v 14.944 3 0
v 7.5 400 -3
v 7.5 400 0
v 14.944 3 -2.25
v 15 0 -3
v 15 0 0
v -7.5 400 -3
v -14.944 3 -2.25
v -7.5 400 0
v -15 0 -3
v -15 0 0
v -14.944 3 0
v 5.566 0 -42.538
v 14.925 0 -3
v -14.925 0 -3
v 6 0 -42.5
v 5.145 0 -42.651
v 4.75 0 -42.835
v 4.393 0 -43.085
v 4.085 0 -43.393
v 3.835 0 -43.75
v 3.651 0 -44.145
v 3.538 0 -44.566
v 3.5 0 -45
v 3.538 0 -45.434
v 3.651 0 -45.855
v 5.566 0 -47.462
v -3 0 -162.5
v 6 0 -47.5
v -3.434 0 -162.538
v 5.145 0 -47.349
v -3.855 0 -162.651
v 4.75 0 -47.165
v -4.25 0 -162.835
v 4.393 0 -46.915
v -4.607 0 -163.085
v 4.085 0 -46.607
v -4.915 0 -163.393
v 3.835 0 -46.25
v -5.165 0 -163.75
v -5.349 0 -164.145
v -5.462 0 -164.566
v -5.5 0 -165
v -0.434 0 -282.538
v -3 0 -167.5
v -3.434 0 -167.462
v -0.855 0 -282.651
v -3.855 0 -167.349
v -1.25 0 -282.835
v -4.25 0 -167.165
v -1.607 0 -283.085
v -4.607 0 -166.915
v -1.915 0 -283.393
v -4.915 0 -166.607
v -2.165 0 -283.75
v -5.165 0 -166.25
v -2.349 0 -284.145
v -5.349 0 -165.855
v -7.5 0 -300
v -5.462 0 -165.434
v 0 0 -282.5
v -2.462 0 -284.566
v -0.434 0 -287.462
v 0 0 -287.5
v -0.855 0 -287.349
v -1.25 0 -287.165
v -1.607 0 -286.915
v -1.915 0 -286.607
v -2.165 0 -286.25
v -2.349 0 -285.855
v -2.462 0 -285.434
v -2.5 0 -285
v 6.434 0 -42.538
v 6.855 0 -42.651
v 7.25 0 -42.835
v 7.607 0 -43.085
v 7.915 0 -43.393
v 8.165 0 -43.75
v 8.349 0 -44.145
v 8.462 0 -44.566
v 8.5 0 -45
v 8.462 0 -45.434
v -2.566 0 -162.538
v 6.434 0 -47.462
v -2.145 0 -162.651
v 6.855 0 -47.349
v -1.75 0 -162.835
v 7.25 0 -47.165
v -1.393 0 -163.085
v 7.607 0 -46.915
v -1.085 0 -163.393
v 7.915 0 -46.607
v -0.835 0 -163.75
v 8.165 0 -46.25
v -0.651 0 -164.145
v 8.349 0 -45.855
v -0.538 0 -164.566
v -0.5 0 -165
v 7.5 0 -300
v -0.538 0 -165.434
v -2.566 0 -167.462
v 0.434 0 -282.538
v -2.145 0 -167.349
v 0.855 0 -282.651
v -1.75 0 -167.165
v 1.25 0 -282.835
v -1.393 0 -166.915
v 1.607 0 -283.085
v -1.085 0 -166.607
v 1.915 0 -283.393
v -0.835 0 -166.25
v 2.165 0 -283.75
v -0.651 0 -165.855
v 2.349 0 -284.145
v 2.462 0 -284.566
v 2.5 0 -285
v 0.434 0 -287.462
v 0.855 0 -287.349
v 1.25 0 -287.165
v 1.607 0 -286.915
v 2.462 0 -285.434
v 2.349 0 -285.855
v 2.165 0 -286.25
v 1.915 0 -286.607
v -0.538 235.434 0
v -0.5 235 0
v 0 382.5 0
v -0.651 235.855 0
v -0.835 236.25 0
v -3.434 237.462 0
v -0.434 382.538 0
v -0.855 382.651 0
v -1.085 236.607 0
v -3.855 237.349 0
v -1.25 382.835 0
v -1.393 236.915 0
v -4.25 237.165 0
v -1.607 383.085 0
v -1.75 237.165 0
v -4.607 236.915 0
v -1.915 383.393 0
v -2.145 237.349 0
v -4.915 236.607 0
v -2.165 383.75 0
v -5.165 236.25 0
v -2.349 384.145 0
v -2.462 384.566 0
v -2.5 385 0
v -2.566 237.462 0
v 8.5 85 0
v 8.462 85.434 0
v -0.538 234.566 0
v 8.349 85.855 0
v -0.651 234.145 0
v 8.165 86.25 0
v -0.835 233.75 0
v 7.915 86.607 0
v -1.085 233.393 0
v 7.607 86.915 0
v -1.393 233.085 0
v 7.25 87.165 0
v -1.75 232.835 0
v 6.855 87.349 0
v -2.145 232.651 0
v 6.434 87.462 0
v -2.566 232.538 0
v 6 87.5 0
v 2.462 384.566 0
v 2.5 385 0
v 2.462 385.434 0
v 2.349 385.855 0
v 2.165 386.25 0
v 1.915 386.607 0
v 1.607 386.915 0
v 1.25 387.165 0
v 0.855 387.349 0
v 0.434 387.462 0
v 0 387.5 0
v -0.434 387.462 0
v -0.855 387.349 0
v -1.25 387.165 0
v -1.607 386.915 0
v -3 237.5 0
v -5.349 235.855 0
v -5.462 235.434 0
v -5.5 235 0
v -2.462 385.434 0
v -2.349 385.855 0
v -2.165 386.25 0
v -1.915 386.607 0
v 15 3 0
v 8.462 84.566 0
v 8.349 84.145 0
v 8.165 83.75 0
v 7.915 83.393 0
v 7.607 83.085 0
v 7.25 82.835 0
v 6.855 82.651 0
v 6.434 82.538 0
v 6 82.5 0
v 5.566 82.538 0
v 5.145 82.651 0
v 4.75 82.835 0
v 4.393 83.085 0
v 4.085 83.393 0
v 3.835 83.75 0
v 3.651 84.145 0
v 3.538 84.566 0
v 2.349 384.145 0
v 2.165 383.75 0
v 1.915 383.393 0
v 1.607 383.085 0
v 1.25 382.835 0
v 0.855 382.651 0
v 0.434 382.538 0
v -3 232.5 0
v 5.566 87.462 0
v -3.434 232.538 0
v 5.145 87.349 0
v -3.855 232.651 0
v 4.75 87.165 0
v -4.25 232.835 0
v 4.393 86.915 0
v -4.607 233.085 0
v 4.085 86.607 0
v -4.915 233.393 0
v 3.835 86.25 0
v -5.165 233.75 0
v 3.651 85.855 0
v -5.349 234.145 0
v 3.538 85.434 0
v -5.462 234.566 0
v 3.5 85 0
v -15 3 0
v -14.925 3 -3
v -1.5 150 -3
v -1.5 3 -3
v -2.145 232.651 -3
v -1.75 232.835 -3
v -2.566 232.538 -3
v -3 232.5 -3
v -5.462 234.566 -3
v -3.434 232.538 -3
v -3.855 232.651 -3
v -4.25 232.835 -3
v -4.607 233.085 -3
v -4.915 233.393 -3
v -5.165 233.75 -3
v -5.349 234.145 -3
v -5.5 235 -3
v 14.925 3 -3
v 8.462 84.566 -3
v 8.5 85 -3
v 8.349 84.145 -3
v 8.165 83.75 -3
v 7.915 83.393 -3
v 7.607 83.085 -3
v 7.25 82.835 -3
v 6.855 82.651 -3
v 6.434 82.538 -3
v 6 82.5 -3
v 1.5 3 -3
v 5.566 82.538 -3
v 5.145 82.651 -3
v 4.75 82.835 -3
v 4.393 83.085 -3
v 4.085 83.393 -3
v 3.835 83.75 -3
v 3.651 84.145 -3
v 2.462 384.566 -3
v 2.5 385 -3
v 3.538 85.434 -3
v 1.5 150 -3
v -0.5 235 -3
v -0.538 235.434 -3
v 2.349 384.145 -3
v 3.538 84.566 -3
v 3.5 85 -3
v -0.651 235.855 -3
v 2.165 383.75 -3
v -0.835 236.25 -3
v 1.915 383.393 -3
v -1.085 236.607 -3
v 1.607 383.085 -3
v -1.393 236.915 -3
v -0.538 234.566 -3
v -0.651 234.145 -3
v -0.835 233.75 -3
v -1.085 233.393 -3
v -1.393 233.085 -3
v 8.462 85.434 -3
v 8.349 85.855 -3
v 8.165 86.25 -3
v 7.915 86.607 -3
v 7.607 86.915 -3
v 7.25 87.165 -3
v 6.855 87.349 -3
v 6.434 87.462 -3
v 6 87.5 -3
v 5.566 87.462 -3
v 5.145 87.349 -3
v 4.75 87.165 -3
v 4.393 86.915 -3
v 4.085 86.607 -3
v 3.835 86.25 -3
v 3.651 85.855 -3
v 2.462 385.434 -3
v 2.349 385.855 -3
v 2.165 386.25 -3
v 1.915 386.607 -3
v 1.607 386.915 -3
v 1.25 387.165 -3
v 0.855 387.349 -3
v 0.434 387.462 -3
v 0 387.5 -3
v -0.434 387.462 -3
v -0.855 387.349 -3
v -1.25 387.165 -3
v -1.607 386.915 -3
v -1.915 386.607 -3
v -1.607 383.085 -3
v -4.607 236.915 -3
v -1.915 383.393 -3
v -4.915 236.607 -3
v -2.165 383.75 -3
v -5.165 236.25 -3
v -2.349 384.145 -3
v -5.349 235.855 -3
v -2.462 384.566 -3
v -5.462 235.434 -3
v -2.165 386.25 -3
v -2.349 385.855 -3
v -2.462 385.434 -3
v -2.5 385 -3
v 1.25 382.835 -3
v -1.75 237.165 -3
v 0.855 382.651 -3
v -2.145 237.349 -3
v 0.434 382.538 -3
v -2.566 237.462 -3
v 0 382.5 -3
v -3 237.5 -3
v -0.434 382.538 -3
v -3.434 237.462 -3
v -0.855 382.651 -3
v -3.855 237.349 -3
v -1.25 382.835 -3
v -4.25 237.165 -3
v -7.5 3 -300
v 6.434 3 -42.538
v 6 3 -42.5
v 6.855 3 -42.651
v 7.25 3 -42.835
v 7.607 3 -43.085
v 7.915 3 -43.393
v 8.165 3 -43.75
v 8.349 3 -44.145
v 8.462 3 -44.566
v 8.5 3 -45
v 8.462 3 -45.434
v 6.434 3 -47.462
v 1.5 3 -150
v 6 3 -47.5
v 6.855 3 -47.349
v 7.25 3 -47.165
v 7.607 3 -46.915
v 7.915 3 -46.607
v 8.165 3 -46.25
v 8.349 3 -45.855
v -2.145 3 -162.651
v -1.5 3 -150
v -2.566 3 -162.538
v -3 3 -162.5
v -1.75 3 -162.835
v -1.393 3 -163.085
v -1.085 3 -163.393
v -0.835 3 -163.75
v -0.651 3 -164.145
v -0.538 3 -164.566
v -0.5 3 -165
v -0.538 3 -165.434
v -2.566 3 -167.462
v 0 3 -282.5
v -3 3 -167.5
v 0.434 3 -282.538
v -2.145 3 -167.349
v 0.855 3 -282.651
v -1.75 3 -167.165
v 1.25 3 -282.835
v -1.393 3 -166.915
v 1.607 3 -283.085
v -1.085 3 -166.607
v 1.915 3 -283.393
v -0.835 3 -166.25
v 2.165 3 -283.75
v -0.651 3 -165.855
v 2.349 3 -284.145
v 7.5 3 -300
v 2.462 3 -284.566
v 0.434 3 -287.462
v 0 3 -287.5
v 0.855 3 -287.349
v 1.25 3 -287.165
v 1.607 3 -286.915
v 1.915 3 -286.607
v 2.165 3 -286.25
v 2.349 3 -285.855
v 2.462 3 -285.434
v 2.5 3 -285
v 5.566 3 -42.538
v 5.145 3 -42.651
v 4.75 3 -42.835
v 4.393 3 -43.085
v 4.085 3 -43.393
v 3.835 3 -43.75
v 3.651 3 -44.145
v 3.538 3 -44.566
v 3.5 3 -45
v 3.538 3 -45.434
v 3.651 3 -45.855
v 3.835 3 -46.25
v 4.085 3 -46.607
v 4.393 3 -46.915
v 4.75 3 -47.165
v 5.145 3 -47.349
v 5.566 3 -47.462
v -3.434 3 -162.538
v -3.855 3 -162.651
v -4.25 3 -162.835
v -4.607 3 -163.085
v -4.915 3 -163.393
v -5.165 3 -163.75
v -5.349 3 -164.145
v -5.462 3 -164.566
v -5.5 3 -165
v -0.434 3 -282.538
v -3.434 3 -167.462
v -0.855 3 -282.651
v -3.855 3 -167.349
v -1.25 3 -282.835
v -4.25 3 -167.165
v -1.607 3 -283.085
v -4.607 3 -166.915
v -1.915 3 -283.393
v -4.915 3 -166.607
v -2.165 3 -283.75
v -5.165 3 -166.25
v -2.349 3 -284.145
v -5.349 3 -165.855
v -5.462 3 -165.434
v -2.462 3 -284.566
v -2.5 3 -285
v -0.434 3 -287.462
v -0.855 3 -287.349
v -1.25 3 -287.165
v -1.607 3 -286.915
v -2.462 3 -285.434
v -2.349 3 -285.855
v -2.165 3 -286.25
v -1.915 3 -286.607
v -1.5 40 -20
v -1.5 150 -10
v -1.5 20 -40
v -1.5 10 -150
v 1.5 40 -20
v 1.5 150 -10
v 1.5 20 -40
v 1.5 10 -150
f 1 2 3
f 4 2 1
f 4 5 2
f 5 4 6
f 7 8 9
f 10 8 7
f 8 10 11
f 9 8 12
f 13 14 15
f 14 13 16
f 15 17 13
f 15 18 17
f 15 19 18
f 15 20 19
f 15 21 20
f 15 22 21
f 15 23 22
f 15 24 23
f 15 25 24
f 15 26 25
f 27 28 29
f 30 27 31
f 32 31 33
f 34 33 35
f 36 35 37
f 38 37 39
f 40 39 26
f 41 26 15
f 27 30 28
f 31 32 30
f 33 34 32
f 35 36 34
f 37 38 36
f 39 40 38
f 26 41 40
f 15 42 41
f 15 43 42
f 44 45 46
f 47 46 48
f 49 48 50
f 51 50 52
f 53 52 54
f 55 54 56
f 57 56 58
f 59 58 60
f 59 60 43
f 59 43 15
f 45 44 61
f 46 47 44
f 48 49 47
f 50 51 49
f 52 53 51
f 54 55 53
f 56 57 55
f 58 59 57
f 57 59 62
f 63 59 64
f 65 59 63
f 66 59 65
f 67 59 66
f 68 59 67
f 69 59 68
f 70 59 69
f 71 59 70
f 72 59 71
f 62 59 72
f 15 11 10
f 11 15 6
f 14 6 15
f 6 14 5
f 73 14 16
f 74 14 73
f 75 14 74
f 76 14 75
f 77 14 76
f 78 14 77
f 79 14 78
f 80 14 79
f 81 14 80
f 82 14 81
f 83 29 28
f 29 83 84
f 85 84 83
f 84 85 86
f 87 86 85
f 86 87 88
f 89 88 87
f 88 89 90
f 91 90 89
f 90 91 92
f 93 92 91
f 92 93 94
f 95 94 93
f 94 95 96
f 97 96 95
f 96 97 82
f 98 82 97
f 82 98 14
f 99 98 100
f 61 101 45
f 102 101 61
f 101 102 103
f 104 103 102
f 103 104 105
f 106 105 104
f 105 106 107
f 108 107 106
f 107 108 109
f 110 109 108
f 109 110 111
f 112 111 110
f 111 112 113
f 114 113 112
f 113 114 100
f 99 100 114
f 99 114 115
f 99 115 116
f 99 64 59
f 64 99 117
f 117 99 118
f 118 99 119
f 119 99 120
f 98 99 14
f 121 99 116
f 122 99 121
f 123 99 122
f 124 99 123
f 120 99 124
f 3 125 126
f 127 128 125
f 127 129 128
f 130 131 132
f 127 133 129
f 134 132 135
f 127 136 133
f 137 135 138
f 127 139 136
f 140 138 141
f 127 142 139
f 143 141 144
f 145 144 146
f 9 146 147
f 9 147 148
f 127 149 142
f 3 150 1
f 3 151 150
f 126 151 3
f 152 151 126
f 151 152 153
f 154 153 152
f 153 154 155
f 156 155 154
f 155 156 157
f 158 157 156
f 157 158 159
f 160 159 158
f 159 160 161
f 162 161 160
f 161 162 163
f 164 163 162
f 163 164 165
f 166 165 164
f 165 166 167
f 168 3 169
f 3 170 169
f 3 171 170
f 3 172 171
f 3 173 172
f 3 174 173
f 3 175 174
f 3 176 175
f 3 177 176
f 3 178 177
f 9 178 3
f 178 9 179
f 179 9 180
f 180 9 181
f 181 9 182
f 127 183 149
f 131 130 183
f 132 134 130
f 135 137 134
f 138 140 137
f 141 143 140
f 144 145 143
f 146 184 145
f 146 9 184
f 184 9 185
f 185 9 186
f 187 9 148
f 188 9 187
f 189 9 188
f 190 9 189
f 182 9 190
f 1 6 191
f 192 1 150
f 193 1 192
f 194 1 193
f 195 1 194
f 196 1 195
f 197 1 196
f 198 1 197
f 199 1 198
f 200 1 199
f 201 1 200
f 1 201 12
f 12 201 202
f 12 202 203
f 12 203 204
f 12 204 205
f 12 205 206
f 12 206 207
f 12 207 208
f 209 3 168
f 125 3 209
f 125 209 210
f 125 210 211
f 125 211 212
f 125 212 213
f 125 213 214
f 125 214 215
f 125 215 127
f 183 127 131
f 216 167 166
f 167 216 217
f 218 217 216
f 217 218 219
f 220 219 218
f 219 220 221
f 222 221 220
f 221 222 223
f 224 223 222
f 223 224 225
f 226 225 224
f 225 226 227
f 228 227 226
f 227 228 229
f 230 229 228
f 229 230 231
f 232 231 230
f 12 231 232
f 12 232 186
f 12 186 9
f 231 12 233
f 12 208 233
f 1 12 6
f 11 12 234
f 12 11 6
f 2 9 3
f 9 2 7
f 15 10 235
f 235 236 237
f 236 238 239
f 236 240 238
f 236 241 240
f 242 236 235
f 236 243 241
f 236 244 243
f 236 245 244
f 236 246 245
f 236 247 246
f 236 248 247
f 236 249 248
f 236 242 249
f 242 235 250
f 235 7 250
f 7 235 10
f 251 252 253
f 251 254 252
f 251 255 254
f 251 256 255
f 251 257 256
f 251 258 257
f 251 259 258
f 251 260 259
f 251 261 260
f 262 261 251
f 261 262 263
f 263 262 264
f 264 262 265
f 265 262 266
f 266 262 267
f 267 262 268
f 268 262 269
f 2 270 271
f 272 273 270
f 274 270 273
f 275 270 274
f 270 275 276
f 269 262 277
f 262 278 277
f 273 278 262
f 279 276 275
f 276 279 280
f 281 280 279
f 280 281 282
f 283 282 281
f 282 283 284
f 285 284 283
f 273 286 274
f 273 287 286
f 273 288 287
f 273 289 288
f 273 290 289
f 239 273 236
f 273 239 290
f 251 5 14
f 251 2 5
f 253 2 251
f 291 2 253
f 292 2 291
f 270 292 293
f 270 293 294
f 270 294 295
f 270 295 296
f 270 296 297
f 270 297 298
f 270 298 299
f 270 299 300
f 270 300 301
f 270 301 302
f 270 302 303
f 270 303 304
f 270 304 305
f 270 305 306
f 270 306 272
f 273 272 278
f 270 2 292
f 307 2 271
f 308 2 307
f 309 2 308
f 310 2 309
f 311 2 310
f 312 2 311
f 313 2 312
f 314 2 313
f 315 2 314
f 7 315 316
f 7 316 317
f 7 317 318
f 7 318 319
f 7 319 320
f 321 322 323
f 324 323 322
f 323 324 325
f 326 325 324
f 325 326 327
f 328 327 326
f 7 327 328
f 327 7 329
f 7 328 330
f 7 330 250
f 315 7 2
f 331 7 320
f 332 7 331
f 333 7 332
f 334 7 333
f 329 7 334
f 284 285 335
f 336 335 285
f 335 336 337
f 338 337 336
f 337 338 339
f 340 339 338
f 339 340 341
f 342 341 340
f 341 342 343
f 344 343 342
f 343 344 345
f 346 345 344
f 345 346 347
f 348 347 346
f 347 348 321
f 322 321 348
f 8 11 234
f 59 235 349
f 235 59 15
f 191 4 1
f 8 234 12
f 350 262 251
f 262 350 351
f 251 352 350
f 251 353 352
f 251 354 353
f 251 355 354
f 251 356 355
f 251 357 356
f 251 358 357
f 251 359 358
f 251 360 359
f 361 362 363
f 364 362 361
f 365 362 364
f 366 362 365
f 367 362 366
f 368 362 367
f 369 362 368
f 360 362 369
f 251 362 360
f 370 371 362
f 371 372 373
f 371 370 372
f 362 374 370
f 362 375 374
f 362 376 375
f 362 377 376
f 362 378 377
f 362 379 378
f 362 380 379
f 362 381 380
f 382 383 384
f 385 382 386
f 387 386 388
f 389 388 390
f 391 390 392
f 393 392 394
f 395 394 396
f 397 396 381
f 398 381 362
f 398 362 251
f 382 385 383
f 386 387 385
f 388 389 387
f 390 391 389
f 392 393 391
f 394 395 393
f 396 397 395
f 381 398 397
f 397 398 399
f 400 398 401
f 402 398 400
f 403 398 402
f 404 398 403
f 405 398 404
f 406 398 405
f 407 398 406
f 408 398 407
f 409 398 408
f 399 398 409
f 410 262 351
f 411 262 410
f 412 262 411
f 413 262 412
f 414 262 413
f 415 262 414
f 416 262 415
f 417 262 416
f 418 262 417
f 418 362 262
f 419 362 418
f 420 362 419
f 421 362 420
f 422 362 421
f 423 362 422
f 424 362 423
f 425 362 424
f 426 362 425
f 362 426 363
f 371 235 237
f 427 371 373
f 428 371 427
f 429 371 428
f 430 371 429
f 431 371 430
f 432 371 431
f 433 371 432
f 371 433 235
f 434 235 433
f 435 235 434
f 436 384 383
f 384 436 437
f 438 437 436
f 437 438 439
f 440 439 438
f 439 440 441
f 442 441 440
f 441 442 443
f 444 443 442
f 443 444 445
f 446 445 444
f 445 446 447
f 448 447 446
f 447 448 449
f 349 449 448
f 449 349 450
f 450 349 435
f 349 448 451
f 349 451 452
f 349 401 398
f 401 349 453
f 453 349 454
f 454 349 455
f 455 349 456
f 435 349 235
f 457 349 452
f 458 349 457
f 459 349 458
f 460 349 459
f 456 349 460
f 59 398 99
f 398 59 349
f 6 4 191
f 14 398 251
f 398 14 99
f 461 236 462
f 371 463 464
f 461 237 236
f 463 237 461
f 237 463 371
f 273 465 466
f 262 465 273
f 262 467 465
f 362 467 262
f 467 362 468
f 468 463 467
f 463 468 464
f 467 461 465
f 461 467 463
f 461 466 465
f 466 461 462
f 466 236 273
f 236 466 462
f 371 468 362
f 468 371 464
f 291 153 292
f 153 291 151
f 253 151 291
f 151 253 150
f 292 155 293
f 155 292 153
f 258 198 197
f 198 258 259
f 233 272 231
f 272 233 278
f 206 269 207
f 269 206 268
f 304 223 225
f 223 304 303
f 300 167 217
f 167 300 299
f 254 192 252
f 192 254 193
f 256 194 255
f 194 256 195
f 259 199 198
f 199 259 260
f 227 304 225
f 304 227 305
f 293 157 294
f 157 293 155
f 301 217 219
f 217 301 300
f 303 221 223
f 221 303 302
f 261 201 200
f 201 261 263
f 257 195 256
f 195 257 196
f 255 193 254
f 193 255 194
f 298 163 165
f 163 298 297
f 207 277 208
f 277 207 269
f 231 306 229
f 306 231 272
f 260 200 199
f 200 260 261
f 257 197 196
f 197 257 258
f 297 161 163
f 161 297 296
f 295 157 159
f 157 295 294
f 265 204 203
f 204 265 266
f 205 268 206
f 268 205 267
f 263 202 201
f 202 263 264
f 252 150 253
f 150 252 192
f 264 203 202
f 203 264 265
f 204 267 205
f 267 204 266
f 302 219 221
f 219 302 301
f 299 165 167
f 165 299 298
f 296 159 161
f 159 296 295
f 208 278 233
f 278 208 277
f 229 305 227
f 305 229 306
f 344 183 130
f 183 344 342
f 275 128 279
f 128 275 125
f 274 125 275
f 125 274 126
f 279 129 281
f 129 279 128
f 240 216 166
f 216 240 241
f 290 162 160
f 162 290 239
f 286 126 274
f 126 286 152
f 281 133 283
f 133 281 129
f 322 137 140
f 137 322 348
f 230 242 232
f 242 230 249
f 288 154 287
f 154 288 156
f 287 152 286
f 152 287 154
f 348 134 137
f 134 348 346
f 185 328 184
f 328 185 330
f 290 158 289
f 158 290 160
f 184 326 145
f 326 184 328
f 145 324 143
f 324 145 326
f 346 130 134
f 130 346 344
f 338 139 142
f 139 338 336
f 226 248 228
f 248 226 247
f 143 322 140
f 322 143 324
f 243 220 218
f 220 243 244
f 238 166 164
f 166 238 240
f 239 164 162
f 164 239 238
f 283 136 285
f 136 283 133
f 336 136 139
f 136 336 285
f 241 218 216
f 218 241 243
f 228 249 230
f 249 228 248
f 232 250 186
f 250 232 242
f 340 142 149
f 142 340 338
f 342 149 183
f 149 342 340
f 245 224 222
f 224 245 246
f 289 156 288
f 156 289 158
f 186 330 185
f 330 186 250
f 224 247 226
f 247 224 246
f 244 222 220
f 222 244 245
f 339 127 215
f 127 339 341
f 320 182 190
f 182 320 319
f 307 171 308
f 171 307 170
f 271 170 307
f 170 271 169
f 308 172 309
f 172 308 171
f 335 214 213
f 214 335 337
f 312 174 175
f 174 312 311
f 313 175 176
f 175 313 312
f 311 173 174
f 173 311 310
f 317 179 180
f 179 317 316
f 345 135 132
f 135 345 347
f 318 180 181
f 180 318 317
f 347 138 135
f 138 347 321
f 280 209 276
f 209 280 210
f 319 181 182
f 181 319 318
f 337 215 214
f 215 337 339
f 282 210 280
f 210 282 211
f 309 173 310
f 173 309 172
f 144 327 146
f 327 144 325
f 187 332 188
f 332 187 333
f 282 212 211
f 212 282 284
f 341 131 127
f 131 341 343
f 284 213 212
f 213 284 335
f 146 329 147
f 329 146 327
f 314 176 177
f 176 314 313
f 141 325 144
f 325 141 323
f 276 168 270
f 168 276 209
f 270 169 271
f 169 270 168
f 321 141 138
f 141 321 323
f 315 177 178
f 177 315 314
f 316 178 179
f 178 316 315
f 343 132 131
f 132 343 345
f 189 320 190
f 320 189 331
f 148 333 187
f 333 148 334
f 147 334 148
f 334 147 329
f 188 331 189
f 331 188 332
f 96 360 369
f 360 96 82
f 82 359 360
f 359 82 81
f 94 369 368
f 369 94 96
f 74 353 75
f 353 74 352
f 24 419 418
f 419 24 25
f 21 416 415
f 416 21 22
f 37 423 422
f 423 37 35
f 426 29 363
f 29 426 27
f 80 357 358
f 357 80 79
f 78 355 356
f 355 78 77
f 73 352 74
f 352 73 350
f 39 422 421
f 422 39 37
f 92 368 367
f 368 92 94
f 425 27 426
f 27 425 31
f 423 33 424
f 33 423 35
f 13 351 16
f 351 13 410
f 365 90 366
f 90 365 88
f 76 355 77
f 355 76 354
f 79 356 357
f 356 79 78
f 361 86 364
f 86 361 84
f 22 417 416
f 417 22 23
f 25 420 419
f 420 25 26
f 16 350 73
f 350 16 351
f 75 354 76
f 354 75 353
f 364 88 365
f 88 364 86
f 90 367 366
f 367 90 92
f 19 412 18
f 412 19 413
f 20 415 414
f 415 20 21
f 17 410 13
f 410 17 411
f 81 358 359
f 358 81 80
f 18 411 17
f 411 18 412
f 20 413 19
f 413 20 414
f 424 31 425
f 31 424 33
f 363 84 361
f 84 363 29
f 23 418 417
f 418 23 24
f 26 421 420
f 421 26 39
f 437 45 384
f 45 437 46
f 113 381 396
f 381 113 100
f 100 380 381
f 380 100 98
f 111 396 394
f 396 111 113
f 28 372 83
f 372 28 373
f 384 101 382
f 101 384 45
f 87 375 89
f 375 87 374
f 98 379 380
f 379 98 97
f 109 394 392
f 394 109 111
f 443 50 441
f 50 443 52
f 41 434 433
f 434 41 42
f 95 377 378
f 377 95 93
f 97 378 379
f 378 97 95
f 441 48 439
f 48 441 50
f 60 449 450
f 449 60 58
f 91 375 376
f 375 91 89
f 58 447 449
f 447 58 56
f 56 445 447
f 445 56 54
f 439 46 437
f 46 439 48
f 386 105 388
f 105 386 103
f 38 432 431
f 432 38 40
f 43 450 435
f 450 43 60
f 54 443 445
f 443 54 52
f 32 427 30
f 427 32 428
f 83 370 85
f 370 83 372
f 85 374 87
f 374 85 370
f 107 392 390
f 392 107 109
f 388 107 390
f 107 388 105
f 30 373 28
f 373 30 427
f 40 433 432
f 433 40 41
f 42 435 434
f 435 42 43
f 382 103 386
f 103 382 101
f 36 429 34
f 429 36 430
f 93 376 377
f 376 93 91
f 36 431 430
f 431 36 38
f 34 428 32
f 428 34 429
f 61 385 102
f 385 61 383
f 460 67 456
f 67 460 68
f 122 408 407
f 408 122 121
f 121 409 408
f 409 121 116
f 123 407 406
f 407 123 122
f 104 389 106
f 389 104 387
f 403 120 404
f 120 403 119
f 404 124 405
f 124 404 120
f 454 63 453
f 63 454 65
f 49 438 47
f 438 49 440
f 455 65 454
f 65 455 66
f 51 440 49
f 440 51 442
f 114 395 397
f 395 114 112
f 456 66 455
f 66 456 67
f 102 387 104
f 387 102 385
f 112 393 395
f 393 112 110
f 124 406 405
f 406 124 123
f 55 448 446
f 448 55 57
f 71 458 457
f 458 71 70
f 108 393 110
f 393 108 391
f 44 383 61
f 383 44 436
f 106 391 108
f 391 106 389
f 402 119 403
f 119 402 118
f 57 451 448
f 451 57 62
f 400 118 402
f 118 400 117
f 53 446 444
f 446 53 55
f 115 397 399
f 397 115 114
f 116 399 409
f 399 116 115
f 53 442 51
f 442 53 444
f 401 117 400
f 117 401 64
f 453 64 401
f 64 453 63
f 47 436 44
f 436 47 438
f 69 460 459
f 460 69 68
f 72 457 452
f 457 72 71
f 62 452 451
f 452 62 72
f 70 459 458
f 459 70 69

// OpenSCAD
$fa = 10;
$fs = 0.1;

bracket_depth = 3;
bracket_big_width = 30;
bracket_small_width = 15;

function big_bracket_origin_to_horizontal_holes_t() = [[6,85,0],[-3,235,0],[0,385,0]];
function big_bracket_origin_to_vertical_holes_t() = [[6,0,-45],[-3,0,-165],[0,0,-285]];

module big_bracket() {
  difference() {
    union() {
      translate([0,0,-bracket_depth])
        linear_extrude(height=bracket_depth,center=false)
          polygon([[-bracket_big_width/2,0],[bracket_big_width/2,0],[bracket_small_width/2,400],[-bracket_small_width/2,400]]);
      rotate([-90,0,0])
        linear_extrude(height=bracket_depth,center=false)
          polygon([[-bracket_big_width/2,0],[bracket_big_width/2,0],[bracket_small_width/2,300],[-bracket_small_width/2,300]]);

      rotate([0,90,0])
        translate([0,0,-bracket_depth/2])
          linear_extrude(height=bracket_depth,center=false)
            polygon([[0,0],[150,0],[150,10],[40,20],[20,40],[10,150],[0,150]]);
    }
    for (hole_t=big_bracket_origin_to_horizontal_holes_t()) {
      translate(hole_t+[0,0,-bracket_depth-1])
        cylinder(bracket_depth+2,r=2.5);
    }
    for (hole_t=big_bracket_origin_to_vertical_holes_t()) {
      translate(hole_t+[0,-1,0])
        rotate([-90,0,0])
          cylinder(bracket_depth+2,r=2.5);
    }
  }
}

big_bracket();
